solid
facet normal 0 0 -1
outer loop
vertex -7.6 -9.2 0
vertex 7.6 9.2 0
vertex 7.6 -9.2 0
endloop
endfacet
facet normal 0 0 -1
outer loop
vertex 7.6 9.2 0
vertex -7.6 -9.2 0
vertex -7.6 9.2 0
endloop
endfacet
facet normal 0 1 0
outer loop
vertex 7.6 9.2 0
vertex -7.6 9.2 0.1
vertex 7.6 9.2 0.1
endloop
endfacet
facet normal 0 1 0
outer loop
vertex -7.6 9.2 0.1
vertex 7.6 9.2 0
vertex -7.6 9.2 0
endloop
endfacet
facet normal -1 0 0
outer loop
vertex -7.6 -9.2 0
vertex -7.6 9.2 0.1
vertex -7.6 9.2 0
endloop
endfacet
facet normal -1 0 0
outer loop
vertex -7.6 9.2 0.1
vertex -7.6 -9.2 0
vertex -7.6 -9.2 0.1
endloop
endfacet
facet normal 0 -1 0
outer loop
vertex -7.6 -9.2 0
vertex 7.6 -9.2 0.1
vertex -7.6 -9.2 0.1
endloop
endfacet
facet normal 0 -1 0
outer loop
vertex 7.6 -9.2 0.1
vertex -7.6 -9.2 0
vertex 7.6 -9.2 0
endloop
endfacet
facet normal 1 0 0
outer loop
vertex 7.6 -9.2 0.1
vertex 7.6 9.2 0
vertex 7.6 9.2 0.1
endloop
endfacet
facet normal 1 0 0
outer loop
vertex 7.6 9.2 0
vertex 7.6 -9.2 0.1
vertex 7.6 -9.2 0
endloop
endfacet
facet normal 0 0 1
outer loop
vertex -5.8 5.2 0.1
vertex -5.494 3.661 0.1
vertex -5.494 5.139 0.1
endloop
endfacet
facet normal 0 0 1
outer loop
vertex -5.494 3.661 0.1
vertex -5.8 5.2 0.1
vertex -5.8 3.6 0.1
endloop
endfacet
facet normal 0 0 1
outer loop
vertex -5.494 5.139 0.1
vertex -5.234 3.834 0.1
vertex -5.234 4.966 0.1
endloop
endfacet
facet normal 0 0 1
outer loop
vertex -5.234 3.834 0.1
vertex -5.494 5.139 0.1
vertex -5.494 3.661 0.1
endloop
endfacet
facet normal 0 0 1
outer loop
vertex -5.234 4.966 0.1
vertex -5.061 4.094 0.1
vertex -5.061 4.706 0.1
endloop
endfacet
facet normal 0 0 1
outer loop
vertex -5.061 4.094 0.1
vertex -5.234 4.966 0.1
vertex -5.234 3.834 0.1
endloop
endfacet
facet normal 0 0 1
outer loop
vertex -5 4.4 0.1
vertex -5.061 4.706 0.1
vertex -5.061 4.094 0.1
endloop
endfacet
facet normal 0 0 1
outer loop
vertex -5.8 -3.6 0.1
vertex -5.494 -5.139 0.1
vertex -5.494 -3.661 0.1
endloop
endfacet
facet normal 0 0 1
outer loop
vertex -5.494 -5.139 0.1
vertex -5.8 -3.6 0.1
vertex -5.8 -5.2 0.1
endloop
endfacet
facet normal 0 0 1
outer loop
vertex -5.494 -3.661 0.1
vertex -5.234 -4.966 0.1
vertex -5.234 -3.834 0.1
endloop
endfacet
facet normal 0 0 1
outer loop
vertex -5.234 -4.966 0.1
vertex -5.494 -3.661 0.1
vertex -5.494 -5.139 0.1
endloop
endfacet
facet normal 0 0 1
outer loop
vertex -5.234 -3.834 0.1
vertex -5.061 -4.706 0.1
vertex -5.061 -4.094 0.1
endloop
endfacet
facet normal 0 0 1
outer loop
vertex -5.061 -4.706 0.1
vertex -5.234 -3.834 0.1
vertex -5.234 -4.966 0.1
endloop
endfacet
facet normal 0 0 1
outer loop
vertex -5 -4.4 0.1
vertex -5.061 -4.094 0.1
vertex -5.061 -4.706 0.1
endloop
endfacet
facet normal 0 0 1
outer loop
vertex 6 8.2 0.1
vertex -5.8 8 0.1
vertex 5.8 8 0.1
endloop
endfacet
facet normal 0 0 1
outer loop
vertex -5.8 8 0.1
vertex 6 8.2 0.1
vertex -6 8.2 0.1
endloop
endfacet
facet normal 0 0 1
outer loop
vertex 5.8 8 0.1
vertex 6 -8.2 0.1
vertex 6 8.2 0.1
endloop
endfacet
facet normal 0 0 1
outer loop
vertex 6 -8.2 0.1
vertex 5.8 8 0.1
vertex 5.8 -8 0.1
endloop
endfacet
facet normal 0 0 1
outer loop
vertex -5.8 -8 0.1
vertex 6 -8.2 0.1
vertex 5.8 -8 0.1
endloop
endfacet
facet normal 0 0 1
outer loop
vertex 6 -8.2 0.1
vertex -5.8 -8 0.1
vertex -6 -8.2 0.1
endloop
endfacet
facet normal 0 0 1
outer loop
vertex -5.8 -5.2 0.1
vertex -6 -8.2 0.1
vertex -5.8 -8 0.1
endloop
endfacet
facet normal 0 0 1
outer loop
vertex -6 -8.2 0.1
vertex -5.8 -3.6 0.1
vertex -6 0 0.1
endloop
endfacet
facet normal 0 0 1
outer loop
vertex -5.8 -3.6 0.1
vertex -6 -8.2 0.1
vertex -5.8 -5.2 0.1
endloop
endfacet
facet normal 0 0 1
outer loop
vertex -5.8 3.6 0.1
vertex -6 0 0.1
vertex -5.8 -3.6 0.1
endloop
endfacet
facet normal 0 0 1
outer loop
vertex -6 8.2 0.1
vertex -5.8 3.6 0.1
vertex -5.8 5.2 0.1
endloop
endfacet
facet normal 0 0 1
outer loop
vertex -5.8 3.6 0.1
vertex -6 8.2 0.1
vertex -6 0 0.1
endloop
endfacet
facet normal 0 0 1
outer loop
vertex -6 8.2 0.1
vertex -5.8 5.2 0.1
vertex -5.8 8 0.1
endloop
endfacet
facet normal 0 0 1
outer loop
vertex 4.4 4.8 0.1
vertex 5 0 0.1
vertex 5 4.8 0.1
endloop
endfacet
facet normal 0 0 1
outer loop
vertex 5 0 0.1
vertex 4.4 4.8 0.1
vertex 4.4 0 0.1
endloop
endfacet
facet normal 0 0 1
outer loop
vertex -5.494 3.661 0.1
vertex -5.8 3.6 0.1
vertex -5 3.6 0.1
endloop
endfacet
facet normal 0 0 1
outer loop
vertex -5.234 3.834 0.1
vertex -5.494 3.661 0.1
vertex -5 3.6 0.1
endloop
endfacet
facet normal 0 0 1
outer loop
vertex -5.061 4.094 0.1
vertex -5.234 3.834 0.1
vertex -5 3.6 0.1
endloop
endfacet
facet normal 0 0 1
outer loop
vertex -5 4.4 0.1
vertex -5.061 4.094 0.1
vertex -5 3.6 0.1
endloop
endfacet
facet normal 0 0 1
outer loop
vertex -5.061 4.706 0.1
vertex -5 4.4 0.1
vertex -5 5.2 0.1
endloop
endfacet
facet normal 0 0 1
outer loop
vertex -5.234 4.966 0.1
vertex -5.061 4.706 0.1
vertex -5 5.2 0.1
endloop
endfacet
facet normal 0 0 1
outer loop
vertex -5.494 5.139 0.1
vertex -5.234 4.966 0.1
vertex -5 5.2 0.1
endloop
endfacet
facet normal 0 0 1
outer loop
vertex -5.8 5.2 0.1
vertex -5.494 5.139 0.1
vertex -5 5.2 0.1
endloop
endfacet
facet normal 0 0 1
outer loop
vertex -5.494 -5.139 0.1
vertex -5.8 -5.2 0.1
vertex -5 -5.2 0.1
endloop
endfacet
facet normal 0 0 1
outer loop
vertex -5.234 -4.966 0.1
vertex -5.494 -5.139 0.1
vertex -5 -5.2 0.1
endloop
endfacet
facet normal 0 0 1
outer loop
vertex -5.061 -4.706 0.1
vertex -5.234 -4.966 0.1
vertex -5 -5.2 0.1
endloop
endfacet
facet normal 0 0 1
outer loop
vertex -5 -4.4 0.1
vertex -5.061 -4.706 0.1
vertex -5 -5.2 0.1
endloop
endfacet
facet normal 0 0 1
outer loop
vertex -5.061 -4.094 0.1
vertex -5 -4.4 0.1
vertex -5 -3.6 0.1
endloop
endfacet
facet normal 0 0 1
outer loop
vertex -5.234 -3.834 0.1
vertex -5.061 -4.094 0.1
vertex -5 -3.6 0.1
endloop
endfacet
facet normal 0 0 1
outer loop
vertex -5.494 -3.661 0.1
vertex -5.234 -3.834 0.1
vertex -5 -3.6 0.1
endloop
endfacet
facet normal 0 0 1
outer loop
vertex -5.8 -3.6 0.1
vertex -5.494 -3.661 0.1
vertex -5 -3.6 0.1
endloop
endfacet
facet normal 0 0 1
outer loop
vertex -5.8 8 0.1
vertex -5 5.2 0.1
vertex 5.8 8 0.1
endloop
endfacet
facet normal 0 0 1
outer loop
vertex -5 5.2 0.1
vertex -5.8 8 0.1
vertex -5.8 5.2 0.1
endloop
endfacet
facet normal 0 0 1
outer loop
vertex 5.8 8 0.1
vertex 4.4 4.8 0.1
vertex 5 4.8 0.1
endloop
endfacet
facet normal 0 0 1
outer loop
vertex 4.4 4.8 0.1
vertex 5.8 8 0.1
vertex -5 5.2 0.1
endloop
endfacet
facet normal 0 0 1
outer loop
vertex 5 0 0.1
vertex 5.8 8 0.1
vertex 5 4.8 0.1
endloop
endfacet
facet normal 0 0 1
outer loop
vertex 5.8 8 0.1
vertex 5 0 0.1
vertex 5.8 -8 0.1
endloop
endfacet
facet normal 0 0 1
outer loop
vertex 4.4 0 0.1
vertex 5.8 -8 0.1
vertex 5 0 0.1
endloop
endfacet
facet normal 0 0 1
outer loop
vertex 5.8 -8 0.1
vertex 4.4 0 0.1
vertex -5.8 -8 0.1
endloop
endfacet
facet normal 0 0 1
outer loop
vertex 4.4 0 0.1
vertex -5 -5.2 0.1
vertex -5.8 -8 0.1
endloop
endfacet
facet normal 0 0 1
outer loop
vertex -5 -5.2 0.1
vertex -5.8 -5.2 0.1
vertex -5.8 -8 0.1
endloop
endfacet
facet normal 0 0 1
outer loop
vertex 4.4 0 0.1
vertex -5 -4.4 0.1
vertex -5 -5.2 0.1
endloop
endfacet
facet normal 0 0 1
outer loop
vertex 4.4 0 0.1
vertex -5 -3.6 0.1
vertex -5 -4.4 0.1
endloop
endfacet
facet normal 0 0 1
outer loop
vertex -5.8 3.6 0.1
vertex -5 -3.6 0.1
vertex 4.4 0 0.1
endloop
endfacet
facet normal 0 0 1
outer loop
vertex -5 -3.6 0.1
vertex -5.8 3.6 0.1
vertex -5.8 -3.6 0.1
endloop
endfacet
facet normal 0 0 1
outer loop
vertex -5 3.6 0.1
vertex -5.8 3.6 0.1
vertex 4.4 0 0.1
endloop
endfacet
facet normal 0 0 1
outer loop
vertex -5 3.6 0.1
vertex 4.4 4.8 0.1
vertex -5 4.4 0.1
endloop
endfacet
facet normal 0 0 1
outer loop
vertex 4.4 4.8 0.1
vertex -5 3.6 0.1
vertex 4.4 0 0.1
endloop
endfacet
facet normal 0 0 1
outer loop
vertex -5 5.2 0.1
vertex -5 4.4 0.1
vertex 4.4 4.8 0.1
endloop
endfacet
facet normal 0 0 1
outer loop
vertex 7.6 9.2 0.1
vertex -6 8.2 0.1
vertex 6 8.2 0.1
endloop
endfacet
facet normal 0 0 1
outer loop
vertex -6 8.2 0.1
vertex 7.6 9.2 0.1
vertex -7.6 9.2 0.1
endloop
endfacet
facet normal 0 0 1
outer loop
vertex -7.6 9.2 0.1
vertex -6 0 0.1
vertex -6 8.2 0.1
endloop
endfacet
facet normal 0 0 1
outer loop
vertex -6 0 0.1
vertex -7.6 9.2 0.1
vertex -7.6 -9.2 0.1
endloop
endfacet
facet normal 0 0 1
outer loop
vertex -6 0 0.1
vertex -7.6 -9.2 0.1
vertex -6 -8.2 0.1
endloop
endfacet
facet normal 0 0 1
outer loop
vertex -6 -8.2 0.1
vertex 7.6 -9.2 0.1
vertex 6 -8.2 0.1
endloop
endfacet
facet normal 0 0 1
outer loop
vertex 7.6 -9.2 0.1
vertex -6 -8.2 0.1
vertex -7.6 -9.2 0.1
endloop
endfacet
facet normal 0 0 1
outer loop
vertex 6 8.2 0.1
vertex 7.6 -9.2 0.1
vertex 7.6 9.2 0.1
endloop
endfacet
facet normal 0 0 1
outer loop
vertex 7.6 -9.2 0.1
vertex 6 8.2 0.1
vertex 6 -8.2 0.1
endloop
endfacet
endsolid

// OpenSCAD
// file: ../p/box5-12.scad
use <../lib.scad>
function ldraw_lib__box5_12() = [
// 0 Box with 5 Faces without Any Edges
// 0 Name: box5-12.dat
// 0 Author: Chris Dee [cwdee]
// 0 !LDRAW_ORG Primitive UPDATE 2009-02
// 0 !LICENSE Licensed under CC BY 4.0 : see CAreadme.txt
// 
// 0 BFC CERTIFY CCW
  [0,"BFC","CERTIFY"],
  [0,"BFC","CCW"],
// 
// 0 !HISTORY 2009-09-03 [PTadmin] Official Update 2009-02
// 
// 
// 4 16 1 1 1 1 1 -1 -1 1 -1 -1 1 1
  [4,16,1,1,1,1,1,-1,-1,1,-1,-1,1,1],
// 4 16 -1 0 1 1 0 1 1 1 1 -1 1 1
  [4,16,-1,0,1,1,0,1,1,1,1,-1,1,1],
// 4 16 -1 0 -1 -1 0 1 -1 1 1 -1 1 -1
  [4,16,-1,0,-1,-1,0,1,-1,1,1,-1,1,-1],
// 4 16 1 0 -1 -1 0 -1 -1 1 -1 1 1 -1
  [4,16,1,0,-1,-1,0,-1,-1,1,-1,1,1,-1],
// 4 16 1 0 1 1 0 -1 1 1 -1 1 1 1
  [4,16,1,0,1,1,0,-1,1,1,-1,1,1,1],
// 0
];
module ldraw_lib__box5_12(step=0, col=false, unit=2/5, alt=false, line=0.2, solid=!$preview)
    makepoly(ldraw_lib__box5_12(), step=step, col=col, unit=unit, alt=alt, line=line, solid=solid);
ldraw_lib__box5_12(line=0.2);
// file: ../p/2-4ndis.scad
use <../lib.scad>
function ldraw_lib__2_4ndis() = [
// 0 Disc Negative 0.5
// 0 Name: 2-4ndis.dat
// 0 Author: James Jessiman
// 0 !LDRAW_ORG Primitive UPDATE 2012-01
// 0 !LICENSE Licensed under CC BY 4.0 : see CAreadme.txt
// 
// 0 BFC CERTIFY CCW
  [0,"BFC","CERTIFY"],
  [0,"BFC","CCW"],
// 
// 0 !HISTORY 2002-03-23 [sbliss] Added BFC statement; compacted code
// 0 !HISTORY 2002-04-25 [PTadmin] Official Update 2002-02
// 0 !HISTORY 2007-06-24 [PTadmin] Header formatted for Contributor Agreement
// 0 !HISTORY 2008-07-01 [PTadmin] Official Update 2008-01
// 0 !HISTORY 2012-02-16 [Philo] Changed to CCW
// 0 !HISTORY 2012-03-30 [PTadmin] Official Update 2012-01
// 
// 
// 3 16 0.9239 0 0.3827 1 0 0 1 0 1
  [3,16,0.9239,0,0.3827,1,0,0,1,0,1],
// 3 16 0.7071 0 0.7071 0.9239 0 0.3827 1 0 1
  [3,16,0.7071,0,0.7071,0.9239,0,0.3827,1,0,1],
// 3 16 0.3827 0 0.9239 0.7071 0 0.7071 1 0 1
  [3,16,0.3827,0,0.9239,0.7071,0,0.7071,1,0,1],
// 3 16 0 0 1 0.3827 0 0.9239 1 0 1
  [3,16,0,0,1,0.3827,0,0.9239,1,0,1],
// 3 16 -0.3827 0 0.9239 0 0 1 -1 0 1
  [3,16,-0.3827,0,0.9239,0,0,1,-1,0,1],
// 3 16 -0.7071 0 0.7071 -0.3827 0 0.9239 -1 0 1
  [3,16,-0.7071,0,0.7071,-0.3827,0,0.9239,-1,0,1],
// 3 16 -0.9239 0 0.3827 -0.7071 0 0.7071 -1 0 1
  [3,16,-0.9239,0,0.3827,-0.7071,0,0.7071,-1,0,1],
// 3 16 -1 0 0 -0.9239 0 0.3827 -1 0 1
  [3,16,-1,0,0,-0.9239,0,0.3827,-1,0,1],
];
module ldraw_lib__2_4ndis(step=0, col=false, unit=2/5, alt=false, line=0.2, solid=!$preview)
    makepoly(ldraw_lib__2_4ndis(), step=step, col=col, unit=unit, alt=alt, line=line, solid=solid);
ldraw_lib__2_4ndis(line=0.2);
// file: ../p/2-4chrd.scad
use <../lib.scad>
function ldraw_lib__2_4chrd() = [
// 0 Chord 0.5
// 0 Name: 2-4chrd.dat
// 0 Author: Philippe Hurbain [Philo]
// 0 !LDRAW_ORG Primitive UPDATE 2014-01
// 0 !LICENSE Licensed under CC BY 4.0 : see CAreadme.txt
// 
// 0 BFC CERTIFY CCW
  [0,"BFC","CERTIFY"],
  [0,"BFC","CCW"],
// 
// 0 !HISTORY 2014-06-21 [PTadmin] Official Update 2014-01
// 
// 
// 4 16 0.9239 0 0.3827 -0.9239 0 0.3827 -1 0 0 1 0 0
  [4,16,0.9239,0,0.3827,-0.9239,0,0.3827,-1,0,0,1,0,0],
// 4 16 0.7071 0 0.7071 -0.7071 0 0.7071 -0.9239 0 0.3827 0.9239 0 0.3827
  [4,16,0.7071,0,0.7071,-0.7071,0,0.7071,-0.9239,0,0.3827,0.9239,0,0.3827],
// 4 16 0.3827 0 0.9239 -0.3827 0 0.9239 -0.7071 0 0.7071 0.7071 0 0.7071
  [4,16,0.3827,0,0.9239,-0.3827,0,0.9239,-0.7071,0,0.7071,0.7071,0,0.7071],
// 3 16 0 0 1 -0.3827 0 0.9239 0.3827 0 0.9239
  [3,16,0,0,1,-0.3827,0,0.9239,0.3827,0,0.9239],
];
module ldraw_lib__2_4chrd(step=0, col=false, unit=2/5, alt=false, line=0.2, solid=!$preview)
    makepoly(ldraw_lib__2_4chrd(), step=step, col=col, unit=unit, alt=alt, line=line, solid=solid);
ldraw_lib__2_4chrd(line=0.2);
// file: 194325d.scad
use <../lib.scad>
use <../p/2-4chrd.scad>
use <../p/2-4ndis.scad>
use <../p/box5-12.scad>
function ldraw_lib__194325d() = [
// 0 Sticker  2.3 x  1.9 with Refrigerator Door
// 0 Name: 194325d.dat
// 0 Author: Takeshi Takahashi [RainbowDolphin]
// 0 !LDRAW_ORG Part UPDATE 2024-08
// 0 !LICENSE Licensed under CC BY 4.0 : see CAreadme.txt
// 
// 0 BFC CERTIFY CCW
  [0,"BFC","CERTIFY"],
  [0,"BFC","CCW"],
// 
// 0 !KEYWORDS cupboard, Kitchen, set 6372
// 
// 0 !HISTORY 2024-09-30 [OrionP] Official Update 2024-08
// 
// 
// 1 16 0 -0.25 0 19 0 0 0 0.25 0 0 0 23 box5-12.dat
  [1,16,0,-0.25,0,19,0,0,0,0.25,0,0,0,23, ldraw_lib__box5_12()],
// 0 BFC NOCLIP
  [0,"BFC","NOCLIP"],
// 1 0 -14.5 -0.25 11 0 0 2 0 1 0 -2 0 0 2-4chrd.dat
  [1,0,-14.5,-0.25,11,0,0,2,0,1,0,-2,0,0, ldraw_lib__2_4chrd()],
// 1 0 -14.5 -0.25 -11 0 0 2 0 1 0 -2 0 0 2-4chrd.dat
  [1,0,-14.5,-0.25,-11,0,0,2,0,1,0,-2,0,0, ldraw_lib__2_4chrd()],
// 4 0 -15 -0.25 20.5 -14.5 -0.25 20 14.5 -0.25 20 15 -0.25 20.5
  [4,0,-15,-0.25,20.5,-14.5,-0.25,20,14.5,-0.25,20,15,-0.25,20.5],
// 4 0 15 -0.25 -20.5 15 -0.25 20.5 14.5 -0.25 20 14.5 -0.25 -20
  [4,0,15,-0.25,-20.5,15,-0.25,20.5,14.5,-0.25,20,14.5,-0.25,-20],
// 4 0 15 -0.25 -20.5 14.5 -0.25 -20 -14.5 -0.25 -20 -15 -0.25 -20.5
  [4,0,15,-0.25,-20.5,14.5,-0.25,-20,-14.5,-0.25,-20,-15,-0.25,-20.5],
// 3 0 -14.5 -0.25 -13 -15 -0.25 -20.5 -14.5 -0.25 -20
  [3,0,-14.5,-0.25,-13,-15,-0.25,-20.5,-14.5,-0.25,-20],
// 4 0 -15 -0.25 -20.5 -14.5 -0.25 -13 -14.5 -0.25 -9 -15 -0.25 0
  [4,0,-15,-0.25,-20.5,-14.5,-0.25,-13,-14.5,-0.25,-9,-15,-0.25,0],
// 3 0 -14.5 -0.25 9 -15 -0.25 0 -14.5 -0.25 -9
  [3,0,-14.5,-0.25,9,-15,-0.25,0,-14.5,-0.25,-9],
// 4 0 -15 -0.25 0 -14.5 -0.25 9 -14.5 -0.25 13 -15 -0.25 20.5
  [4,0,-15,-0.25,0,-14.5,-0.25,9,-14.5,-0.25,13,-15,-0.25,20.5],
// 3 0 -15 -0.25 20.5 -14.5 -0.25 13 -14.5 -0.25 20
  [3,0,-15,-0.25,20.5,-14.5,-0.25,13,-14.5,-0.25,20],
// 4 0 12.5 -0.25 12 11 -0.25 12 11 -0.25 0 12.5 -0.25 0
  [4,0,12.5,-0.25,12,11,-0.25,12,11,-0.25,0,12.5,-0.25,0],
// 0 BFC CLIP
  [0,"BFC","CLIP"],
// 1 16 -14.5 -0.25 11 0 0 2 0 1 0 -2 0 0 2-4ndis.dat
  [1,16,-14.5,-0.25,11,0,0,2,0,1,0,-2,0,0, ldraw_lib__2_4ndis()],
// 1 16 -14.5 -0.25 -11 0 0 2 0 1 0 -2 0 0 2-4ndis.dat
  [1,16,-14.5,-0.25,-11,0,0,2,0,1,0,-2,0,0, ldraw_lib__2_4ndis()],
// 4 16 14.5 -0.25 20 -14.5 -0.25 20 -14.5 -0.25 13 -12.5 -0.25 13
  [4,16,14.5,-0.25,20,-14.5,-0.25,20,-14.5,-0.25,13,-12.5,-0.25,13],
// 4 16 14.5 -0.25 20 -12.5 -0.25 13 11 -0.25 12 12.5 -0.25 12
  [4,16,14.5,-0.25,20,-12.5,-0.25,13,11,-0.25,12,12.5,-0.25,12],
// 4 16 14.5 -0.25 20 12.5 -0.25 12 12.5 -0.25 0 14.5 -0.25 -20
  [4,16,14.5,-0.25,20,12.5,-0.25,12,12.5,-0.25,0,14.5,-0.25,-20],
// 4 16 14.5 -0.25 -20 12.5 -0.25 0 11 -0.25 0 -14.5 -0.25 -20
  [4,16,14.5,-0.25,-20,12.5,-0.25,0,11,-0.25,0,-14.5,-0.25,-20],
// 3 16 11 -0.25 0 -12.5 -0.25 -13 -14.5 -0.25 -20
  [3,16,11,-0.25,0,-12.5,-0.25,-13,-14.5,-0.25,-20],
// 3 16 -12.5 -0.25 -13 -14.5 -0.25 -13 -14.5 -0.25 -20
  [3,16,-12.5,-0.25,-13,-14.5,-0.25,-13,-14.5,-0.25,-20],
// 3 16 11 -0.25 0 -12.5 -0.25 -11 -12.5 -0.25 -13
  [3,16,11,-0.25,0,-12.5,-0.25,-11,-12.5,-0.25,-13],
// 3 16 11 -0.25 0 -12.5 -0.25 -9 -12.5 -0.25 -11
  [3,16,11,-0.25,0,-12.5,-0.25,-9,-12.5,-0.25,-11],
// 4 16 -14.5 -0.25 -9 -12.5 -0.25 -9 11 -0.25 0 -14.5 -0.25 9
  [4,16,-14.5,-0.25,-9,-12.5,-0.25,-9,11,-0.25,0,-14.5,-0.25,9],
// 3 16 -12.5 -0.25 9 -14.5 -0.25 9 11 -0.25 0
  [3,16,-12.5,-0.25,9,-14.5,-0.25,9,11,-0.25,0],
// 4 16 -12.5 -0.25 9 11 -0.25 0 11 -0.25 12 -12.5 -0.25 11
  [4,16,-12.5,-0.25,9,11,-0.25,0,11,-0.25,12,-12.5,-0.25,11],
// 3 16 -12.5 -0.25 13 -12.5 -0.25 11 11 -0.25 12
  [3,16,-12.5,-0.25,13,-12.5,-0.25,11,11,-0.25,12],
// 4 16 15 -0.25 20.5 19 -0.25 23 -19 -0.25 23 -15 -0.25 20.5
  [4,16,15,-0.25,20.5,19,-0.25,23,-19,-0.25,23,-15,-0.25,20.5],
// 4 16 -15 -0.25 0 -15 -0.25 20.5 -19 -0.25 23 -19 -0.25 -23
  [4,16,-15,-0.25,0,-15,-0.25,20.5,-19,-0.25,23,-19,-0.25,-23],
// 3 16 -15 -0.25 0 -19 -0.25 -23 -15 -0.25 -20.5
  [3,16,-15,-0.25,0,-19,-0.25,-23,-15,-0.25,-20.5],
// 4 16 15 -0.25 -20.5 -15 -0.25 -20.5 -19 -0.25 -23 19 -0.25 -23
  [4,16,15,-0.25,-20.5,-15,-0.25,-20.5,-19,-0.25,-23,19,-0.25,-23],
// 4 16 15 -0.25 20.5 15 -0.25 -20.5 19 -0.25 -23 19 -0.25 23
  [4,16,15,-0.25,20.5,15,-0.25,-20.5,19,-0.25,-23,19,-0.25,23],
];
module ldraw_lib__194325d(step=0, col=false, unit=2/5, alt=false, line=0.2, solid=!$preview)
    makepoly(ldraw_lib__194325d(), step=step, col=col, unit=unit, alt=alt, line=line, solid=solid);
ldraw_lib__194325d(line=0.2);
// main file
use <../lib.scad>
use <194325d.scad>
function ldraw_lib__195375b() = [
// 0 =Sticker  2.3 x  1.9 with Refrigerator Door
// 0 Name: 195375b.dat
// 0 Author: Gabriel Läufer [Dr.Bricktacular]
// 0 !LDRAW_ORG Part Alias UPDATE 2025-07
// 0 !LICENSE Licensed under CC BY 4.0 : see CAreadme.txt
// 
// 0 BFC CERTIFY CCW
  [0,"BFC","CERTIFY"],
  [0,"BFC","CCW"],
// 
// 0 !KEYWORDS Bricklink 6374.1stk01, Brickowl 219870, Classic Town, Holiday home
// 0 !KEYWORDS Rebrickable 195375, Set 6374
// 
// 0 !HISTORY 2025-07-27 [OrionP] Official Update 2025-07
// 
// 0 // Alias of partnumber 194325d
// 1 16 0 0 0 1 0 0 0 1 0 0 0 1 194325d.dat
  [1,16,0,0,0,1,0,0,0,1,0,0,0,1, ldraw_lib__194325d()],
];
module ldraw_lib__195375b(step=0, col=false, unit=2/5, alt=false, line=0.2, solid=!$preview)
    makepoly(ldraw_lib__195375b(), step=step, col=col, unit=unit, alt=alt, line=line, solid=solid);
ldraw_lib__195375b(line=0.2);
